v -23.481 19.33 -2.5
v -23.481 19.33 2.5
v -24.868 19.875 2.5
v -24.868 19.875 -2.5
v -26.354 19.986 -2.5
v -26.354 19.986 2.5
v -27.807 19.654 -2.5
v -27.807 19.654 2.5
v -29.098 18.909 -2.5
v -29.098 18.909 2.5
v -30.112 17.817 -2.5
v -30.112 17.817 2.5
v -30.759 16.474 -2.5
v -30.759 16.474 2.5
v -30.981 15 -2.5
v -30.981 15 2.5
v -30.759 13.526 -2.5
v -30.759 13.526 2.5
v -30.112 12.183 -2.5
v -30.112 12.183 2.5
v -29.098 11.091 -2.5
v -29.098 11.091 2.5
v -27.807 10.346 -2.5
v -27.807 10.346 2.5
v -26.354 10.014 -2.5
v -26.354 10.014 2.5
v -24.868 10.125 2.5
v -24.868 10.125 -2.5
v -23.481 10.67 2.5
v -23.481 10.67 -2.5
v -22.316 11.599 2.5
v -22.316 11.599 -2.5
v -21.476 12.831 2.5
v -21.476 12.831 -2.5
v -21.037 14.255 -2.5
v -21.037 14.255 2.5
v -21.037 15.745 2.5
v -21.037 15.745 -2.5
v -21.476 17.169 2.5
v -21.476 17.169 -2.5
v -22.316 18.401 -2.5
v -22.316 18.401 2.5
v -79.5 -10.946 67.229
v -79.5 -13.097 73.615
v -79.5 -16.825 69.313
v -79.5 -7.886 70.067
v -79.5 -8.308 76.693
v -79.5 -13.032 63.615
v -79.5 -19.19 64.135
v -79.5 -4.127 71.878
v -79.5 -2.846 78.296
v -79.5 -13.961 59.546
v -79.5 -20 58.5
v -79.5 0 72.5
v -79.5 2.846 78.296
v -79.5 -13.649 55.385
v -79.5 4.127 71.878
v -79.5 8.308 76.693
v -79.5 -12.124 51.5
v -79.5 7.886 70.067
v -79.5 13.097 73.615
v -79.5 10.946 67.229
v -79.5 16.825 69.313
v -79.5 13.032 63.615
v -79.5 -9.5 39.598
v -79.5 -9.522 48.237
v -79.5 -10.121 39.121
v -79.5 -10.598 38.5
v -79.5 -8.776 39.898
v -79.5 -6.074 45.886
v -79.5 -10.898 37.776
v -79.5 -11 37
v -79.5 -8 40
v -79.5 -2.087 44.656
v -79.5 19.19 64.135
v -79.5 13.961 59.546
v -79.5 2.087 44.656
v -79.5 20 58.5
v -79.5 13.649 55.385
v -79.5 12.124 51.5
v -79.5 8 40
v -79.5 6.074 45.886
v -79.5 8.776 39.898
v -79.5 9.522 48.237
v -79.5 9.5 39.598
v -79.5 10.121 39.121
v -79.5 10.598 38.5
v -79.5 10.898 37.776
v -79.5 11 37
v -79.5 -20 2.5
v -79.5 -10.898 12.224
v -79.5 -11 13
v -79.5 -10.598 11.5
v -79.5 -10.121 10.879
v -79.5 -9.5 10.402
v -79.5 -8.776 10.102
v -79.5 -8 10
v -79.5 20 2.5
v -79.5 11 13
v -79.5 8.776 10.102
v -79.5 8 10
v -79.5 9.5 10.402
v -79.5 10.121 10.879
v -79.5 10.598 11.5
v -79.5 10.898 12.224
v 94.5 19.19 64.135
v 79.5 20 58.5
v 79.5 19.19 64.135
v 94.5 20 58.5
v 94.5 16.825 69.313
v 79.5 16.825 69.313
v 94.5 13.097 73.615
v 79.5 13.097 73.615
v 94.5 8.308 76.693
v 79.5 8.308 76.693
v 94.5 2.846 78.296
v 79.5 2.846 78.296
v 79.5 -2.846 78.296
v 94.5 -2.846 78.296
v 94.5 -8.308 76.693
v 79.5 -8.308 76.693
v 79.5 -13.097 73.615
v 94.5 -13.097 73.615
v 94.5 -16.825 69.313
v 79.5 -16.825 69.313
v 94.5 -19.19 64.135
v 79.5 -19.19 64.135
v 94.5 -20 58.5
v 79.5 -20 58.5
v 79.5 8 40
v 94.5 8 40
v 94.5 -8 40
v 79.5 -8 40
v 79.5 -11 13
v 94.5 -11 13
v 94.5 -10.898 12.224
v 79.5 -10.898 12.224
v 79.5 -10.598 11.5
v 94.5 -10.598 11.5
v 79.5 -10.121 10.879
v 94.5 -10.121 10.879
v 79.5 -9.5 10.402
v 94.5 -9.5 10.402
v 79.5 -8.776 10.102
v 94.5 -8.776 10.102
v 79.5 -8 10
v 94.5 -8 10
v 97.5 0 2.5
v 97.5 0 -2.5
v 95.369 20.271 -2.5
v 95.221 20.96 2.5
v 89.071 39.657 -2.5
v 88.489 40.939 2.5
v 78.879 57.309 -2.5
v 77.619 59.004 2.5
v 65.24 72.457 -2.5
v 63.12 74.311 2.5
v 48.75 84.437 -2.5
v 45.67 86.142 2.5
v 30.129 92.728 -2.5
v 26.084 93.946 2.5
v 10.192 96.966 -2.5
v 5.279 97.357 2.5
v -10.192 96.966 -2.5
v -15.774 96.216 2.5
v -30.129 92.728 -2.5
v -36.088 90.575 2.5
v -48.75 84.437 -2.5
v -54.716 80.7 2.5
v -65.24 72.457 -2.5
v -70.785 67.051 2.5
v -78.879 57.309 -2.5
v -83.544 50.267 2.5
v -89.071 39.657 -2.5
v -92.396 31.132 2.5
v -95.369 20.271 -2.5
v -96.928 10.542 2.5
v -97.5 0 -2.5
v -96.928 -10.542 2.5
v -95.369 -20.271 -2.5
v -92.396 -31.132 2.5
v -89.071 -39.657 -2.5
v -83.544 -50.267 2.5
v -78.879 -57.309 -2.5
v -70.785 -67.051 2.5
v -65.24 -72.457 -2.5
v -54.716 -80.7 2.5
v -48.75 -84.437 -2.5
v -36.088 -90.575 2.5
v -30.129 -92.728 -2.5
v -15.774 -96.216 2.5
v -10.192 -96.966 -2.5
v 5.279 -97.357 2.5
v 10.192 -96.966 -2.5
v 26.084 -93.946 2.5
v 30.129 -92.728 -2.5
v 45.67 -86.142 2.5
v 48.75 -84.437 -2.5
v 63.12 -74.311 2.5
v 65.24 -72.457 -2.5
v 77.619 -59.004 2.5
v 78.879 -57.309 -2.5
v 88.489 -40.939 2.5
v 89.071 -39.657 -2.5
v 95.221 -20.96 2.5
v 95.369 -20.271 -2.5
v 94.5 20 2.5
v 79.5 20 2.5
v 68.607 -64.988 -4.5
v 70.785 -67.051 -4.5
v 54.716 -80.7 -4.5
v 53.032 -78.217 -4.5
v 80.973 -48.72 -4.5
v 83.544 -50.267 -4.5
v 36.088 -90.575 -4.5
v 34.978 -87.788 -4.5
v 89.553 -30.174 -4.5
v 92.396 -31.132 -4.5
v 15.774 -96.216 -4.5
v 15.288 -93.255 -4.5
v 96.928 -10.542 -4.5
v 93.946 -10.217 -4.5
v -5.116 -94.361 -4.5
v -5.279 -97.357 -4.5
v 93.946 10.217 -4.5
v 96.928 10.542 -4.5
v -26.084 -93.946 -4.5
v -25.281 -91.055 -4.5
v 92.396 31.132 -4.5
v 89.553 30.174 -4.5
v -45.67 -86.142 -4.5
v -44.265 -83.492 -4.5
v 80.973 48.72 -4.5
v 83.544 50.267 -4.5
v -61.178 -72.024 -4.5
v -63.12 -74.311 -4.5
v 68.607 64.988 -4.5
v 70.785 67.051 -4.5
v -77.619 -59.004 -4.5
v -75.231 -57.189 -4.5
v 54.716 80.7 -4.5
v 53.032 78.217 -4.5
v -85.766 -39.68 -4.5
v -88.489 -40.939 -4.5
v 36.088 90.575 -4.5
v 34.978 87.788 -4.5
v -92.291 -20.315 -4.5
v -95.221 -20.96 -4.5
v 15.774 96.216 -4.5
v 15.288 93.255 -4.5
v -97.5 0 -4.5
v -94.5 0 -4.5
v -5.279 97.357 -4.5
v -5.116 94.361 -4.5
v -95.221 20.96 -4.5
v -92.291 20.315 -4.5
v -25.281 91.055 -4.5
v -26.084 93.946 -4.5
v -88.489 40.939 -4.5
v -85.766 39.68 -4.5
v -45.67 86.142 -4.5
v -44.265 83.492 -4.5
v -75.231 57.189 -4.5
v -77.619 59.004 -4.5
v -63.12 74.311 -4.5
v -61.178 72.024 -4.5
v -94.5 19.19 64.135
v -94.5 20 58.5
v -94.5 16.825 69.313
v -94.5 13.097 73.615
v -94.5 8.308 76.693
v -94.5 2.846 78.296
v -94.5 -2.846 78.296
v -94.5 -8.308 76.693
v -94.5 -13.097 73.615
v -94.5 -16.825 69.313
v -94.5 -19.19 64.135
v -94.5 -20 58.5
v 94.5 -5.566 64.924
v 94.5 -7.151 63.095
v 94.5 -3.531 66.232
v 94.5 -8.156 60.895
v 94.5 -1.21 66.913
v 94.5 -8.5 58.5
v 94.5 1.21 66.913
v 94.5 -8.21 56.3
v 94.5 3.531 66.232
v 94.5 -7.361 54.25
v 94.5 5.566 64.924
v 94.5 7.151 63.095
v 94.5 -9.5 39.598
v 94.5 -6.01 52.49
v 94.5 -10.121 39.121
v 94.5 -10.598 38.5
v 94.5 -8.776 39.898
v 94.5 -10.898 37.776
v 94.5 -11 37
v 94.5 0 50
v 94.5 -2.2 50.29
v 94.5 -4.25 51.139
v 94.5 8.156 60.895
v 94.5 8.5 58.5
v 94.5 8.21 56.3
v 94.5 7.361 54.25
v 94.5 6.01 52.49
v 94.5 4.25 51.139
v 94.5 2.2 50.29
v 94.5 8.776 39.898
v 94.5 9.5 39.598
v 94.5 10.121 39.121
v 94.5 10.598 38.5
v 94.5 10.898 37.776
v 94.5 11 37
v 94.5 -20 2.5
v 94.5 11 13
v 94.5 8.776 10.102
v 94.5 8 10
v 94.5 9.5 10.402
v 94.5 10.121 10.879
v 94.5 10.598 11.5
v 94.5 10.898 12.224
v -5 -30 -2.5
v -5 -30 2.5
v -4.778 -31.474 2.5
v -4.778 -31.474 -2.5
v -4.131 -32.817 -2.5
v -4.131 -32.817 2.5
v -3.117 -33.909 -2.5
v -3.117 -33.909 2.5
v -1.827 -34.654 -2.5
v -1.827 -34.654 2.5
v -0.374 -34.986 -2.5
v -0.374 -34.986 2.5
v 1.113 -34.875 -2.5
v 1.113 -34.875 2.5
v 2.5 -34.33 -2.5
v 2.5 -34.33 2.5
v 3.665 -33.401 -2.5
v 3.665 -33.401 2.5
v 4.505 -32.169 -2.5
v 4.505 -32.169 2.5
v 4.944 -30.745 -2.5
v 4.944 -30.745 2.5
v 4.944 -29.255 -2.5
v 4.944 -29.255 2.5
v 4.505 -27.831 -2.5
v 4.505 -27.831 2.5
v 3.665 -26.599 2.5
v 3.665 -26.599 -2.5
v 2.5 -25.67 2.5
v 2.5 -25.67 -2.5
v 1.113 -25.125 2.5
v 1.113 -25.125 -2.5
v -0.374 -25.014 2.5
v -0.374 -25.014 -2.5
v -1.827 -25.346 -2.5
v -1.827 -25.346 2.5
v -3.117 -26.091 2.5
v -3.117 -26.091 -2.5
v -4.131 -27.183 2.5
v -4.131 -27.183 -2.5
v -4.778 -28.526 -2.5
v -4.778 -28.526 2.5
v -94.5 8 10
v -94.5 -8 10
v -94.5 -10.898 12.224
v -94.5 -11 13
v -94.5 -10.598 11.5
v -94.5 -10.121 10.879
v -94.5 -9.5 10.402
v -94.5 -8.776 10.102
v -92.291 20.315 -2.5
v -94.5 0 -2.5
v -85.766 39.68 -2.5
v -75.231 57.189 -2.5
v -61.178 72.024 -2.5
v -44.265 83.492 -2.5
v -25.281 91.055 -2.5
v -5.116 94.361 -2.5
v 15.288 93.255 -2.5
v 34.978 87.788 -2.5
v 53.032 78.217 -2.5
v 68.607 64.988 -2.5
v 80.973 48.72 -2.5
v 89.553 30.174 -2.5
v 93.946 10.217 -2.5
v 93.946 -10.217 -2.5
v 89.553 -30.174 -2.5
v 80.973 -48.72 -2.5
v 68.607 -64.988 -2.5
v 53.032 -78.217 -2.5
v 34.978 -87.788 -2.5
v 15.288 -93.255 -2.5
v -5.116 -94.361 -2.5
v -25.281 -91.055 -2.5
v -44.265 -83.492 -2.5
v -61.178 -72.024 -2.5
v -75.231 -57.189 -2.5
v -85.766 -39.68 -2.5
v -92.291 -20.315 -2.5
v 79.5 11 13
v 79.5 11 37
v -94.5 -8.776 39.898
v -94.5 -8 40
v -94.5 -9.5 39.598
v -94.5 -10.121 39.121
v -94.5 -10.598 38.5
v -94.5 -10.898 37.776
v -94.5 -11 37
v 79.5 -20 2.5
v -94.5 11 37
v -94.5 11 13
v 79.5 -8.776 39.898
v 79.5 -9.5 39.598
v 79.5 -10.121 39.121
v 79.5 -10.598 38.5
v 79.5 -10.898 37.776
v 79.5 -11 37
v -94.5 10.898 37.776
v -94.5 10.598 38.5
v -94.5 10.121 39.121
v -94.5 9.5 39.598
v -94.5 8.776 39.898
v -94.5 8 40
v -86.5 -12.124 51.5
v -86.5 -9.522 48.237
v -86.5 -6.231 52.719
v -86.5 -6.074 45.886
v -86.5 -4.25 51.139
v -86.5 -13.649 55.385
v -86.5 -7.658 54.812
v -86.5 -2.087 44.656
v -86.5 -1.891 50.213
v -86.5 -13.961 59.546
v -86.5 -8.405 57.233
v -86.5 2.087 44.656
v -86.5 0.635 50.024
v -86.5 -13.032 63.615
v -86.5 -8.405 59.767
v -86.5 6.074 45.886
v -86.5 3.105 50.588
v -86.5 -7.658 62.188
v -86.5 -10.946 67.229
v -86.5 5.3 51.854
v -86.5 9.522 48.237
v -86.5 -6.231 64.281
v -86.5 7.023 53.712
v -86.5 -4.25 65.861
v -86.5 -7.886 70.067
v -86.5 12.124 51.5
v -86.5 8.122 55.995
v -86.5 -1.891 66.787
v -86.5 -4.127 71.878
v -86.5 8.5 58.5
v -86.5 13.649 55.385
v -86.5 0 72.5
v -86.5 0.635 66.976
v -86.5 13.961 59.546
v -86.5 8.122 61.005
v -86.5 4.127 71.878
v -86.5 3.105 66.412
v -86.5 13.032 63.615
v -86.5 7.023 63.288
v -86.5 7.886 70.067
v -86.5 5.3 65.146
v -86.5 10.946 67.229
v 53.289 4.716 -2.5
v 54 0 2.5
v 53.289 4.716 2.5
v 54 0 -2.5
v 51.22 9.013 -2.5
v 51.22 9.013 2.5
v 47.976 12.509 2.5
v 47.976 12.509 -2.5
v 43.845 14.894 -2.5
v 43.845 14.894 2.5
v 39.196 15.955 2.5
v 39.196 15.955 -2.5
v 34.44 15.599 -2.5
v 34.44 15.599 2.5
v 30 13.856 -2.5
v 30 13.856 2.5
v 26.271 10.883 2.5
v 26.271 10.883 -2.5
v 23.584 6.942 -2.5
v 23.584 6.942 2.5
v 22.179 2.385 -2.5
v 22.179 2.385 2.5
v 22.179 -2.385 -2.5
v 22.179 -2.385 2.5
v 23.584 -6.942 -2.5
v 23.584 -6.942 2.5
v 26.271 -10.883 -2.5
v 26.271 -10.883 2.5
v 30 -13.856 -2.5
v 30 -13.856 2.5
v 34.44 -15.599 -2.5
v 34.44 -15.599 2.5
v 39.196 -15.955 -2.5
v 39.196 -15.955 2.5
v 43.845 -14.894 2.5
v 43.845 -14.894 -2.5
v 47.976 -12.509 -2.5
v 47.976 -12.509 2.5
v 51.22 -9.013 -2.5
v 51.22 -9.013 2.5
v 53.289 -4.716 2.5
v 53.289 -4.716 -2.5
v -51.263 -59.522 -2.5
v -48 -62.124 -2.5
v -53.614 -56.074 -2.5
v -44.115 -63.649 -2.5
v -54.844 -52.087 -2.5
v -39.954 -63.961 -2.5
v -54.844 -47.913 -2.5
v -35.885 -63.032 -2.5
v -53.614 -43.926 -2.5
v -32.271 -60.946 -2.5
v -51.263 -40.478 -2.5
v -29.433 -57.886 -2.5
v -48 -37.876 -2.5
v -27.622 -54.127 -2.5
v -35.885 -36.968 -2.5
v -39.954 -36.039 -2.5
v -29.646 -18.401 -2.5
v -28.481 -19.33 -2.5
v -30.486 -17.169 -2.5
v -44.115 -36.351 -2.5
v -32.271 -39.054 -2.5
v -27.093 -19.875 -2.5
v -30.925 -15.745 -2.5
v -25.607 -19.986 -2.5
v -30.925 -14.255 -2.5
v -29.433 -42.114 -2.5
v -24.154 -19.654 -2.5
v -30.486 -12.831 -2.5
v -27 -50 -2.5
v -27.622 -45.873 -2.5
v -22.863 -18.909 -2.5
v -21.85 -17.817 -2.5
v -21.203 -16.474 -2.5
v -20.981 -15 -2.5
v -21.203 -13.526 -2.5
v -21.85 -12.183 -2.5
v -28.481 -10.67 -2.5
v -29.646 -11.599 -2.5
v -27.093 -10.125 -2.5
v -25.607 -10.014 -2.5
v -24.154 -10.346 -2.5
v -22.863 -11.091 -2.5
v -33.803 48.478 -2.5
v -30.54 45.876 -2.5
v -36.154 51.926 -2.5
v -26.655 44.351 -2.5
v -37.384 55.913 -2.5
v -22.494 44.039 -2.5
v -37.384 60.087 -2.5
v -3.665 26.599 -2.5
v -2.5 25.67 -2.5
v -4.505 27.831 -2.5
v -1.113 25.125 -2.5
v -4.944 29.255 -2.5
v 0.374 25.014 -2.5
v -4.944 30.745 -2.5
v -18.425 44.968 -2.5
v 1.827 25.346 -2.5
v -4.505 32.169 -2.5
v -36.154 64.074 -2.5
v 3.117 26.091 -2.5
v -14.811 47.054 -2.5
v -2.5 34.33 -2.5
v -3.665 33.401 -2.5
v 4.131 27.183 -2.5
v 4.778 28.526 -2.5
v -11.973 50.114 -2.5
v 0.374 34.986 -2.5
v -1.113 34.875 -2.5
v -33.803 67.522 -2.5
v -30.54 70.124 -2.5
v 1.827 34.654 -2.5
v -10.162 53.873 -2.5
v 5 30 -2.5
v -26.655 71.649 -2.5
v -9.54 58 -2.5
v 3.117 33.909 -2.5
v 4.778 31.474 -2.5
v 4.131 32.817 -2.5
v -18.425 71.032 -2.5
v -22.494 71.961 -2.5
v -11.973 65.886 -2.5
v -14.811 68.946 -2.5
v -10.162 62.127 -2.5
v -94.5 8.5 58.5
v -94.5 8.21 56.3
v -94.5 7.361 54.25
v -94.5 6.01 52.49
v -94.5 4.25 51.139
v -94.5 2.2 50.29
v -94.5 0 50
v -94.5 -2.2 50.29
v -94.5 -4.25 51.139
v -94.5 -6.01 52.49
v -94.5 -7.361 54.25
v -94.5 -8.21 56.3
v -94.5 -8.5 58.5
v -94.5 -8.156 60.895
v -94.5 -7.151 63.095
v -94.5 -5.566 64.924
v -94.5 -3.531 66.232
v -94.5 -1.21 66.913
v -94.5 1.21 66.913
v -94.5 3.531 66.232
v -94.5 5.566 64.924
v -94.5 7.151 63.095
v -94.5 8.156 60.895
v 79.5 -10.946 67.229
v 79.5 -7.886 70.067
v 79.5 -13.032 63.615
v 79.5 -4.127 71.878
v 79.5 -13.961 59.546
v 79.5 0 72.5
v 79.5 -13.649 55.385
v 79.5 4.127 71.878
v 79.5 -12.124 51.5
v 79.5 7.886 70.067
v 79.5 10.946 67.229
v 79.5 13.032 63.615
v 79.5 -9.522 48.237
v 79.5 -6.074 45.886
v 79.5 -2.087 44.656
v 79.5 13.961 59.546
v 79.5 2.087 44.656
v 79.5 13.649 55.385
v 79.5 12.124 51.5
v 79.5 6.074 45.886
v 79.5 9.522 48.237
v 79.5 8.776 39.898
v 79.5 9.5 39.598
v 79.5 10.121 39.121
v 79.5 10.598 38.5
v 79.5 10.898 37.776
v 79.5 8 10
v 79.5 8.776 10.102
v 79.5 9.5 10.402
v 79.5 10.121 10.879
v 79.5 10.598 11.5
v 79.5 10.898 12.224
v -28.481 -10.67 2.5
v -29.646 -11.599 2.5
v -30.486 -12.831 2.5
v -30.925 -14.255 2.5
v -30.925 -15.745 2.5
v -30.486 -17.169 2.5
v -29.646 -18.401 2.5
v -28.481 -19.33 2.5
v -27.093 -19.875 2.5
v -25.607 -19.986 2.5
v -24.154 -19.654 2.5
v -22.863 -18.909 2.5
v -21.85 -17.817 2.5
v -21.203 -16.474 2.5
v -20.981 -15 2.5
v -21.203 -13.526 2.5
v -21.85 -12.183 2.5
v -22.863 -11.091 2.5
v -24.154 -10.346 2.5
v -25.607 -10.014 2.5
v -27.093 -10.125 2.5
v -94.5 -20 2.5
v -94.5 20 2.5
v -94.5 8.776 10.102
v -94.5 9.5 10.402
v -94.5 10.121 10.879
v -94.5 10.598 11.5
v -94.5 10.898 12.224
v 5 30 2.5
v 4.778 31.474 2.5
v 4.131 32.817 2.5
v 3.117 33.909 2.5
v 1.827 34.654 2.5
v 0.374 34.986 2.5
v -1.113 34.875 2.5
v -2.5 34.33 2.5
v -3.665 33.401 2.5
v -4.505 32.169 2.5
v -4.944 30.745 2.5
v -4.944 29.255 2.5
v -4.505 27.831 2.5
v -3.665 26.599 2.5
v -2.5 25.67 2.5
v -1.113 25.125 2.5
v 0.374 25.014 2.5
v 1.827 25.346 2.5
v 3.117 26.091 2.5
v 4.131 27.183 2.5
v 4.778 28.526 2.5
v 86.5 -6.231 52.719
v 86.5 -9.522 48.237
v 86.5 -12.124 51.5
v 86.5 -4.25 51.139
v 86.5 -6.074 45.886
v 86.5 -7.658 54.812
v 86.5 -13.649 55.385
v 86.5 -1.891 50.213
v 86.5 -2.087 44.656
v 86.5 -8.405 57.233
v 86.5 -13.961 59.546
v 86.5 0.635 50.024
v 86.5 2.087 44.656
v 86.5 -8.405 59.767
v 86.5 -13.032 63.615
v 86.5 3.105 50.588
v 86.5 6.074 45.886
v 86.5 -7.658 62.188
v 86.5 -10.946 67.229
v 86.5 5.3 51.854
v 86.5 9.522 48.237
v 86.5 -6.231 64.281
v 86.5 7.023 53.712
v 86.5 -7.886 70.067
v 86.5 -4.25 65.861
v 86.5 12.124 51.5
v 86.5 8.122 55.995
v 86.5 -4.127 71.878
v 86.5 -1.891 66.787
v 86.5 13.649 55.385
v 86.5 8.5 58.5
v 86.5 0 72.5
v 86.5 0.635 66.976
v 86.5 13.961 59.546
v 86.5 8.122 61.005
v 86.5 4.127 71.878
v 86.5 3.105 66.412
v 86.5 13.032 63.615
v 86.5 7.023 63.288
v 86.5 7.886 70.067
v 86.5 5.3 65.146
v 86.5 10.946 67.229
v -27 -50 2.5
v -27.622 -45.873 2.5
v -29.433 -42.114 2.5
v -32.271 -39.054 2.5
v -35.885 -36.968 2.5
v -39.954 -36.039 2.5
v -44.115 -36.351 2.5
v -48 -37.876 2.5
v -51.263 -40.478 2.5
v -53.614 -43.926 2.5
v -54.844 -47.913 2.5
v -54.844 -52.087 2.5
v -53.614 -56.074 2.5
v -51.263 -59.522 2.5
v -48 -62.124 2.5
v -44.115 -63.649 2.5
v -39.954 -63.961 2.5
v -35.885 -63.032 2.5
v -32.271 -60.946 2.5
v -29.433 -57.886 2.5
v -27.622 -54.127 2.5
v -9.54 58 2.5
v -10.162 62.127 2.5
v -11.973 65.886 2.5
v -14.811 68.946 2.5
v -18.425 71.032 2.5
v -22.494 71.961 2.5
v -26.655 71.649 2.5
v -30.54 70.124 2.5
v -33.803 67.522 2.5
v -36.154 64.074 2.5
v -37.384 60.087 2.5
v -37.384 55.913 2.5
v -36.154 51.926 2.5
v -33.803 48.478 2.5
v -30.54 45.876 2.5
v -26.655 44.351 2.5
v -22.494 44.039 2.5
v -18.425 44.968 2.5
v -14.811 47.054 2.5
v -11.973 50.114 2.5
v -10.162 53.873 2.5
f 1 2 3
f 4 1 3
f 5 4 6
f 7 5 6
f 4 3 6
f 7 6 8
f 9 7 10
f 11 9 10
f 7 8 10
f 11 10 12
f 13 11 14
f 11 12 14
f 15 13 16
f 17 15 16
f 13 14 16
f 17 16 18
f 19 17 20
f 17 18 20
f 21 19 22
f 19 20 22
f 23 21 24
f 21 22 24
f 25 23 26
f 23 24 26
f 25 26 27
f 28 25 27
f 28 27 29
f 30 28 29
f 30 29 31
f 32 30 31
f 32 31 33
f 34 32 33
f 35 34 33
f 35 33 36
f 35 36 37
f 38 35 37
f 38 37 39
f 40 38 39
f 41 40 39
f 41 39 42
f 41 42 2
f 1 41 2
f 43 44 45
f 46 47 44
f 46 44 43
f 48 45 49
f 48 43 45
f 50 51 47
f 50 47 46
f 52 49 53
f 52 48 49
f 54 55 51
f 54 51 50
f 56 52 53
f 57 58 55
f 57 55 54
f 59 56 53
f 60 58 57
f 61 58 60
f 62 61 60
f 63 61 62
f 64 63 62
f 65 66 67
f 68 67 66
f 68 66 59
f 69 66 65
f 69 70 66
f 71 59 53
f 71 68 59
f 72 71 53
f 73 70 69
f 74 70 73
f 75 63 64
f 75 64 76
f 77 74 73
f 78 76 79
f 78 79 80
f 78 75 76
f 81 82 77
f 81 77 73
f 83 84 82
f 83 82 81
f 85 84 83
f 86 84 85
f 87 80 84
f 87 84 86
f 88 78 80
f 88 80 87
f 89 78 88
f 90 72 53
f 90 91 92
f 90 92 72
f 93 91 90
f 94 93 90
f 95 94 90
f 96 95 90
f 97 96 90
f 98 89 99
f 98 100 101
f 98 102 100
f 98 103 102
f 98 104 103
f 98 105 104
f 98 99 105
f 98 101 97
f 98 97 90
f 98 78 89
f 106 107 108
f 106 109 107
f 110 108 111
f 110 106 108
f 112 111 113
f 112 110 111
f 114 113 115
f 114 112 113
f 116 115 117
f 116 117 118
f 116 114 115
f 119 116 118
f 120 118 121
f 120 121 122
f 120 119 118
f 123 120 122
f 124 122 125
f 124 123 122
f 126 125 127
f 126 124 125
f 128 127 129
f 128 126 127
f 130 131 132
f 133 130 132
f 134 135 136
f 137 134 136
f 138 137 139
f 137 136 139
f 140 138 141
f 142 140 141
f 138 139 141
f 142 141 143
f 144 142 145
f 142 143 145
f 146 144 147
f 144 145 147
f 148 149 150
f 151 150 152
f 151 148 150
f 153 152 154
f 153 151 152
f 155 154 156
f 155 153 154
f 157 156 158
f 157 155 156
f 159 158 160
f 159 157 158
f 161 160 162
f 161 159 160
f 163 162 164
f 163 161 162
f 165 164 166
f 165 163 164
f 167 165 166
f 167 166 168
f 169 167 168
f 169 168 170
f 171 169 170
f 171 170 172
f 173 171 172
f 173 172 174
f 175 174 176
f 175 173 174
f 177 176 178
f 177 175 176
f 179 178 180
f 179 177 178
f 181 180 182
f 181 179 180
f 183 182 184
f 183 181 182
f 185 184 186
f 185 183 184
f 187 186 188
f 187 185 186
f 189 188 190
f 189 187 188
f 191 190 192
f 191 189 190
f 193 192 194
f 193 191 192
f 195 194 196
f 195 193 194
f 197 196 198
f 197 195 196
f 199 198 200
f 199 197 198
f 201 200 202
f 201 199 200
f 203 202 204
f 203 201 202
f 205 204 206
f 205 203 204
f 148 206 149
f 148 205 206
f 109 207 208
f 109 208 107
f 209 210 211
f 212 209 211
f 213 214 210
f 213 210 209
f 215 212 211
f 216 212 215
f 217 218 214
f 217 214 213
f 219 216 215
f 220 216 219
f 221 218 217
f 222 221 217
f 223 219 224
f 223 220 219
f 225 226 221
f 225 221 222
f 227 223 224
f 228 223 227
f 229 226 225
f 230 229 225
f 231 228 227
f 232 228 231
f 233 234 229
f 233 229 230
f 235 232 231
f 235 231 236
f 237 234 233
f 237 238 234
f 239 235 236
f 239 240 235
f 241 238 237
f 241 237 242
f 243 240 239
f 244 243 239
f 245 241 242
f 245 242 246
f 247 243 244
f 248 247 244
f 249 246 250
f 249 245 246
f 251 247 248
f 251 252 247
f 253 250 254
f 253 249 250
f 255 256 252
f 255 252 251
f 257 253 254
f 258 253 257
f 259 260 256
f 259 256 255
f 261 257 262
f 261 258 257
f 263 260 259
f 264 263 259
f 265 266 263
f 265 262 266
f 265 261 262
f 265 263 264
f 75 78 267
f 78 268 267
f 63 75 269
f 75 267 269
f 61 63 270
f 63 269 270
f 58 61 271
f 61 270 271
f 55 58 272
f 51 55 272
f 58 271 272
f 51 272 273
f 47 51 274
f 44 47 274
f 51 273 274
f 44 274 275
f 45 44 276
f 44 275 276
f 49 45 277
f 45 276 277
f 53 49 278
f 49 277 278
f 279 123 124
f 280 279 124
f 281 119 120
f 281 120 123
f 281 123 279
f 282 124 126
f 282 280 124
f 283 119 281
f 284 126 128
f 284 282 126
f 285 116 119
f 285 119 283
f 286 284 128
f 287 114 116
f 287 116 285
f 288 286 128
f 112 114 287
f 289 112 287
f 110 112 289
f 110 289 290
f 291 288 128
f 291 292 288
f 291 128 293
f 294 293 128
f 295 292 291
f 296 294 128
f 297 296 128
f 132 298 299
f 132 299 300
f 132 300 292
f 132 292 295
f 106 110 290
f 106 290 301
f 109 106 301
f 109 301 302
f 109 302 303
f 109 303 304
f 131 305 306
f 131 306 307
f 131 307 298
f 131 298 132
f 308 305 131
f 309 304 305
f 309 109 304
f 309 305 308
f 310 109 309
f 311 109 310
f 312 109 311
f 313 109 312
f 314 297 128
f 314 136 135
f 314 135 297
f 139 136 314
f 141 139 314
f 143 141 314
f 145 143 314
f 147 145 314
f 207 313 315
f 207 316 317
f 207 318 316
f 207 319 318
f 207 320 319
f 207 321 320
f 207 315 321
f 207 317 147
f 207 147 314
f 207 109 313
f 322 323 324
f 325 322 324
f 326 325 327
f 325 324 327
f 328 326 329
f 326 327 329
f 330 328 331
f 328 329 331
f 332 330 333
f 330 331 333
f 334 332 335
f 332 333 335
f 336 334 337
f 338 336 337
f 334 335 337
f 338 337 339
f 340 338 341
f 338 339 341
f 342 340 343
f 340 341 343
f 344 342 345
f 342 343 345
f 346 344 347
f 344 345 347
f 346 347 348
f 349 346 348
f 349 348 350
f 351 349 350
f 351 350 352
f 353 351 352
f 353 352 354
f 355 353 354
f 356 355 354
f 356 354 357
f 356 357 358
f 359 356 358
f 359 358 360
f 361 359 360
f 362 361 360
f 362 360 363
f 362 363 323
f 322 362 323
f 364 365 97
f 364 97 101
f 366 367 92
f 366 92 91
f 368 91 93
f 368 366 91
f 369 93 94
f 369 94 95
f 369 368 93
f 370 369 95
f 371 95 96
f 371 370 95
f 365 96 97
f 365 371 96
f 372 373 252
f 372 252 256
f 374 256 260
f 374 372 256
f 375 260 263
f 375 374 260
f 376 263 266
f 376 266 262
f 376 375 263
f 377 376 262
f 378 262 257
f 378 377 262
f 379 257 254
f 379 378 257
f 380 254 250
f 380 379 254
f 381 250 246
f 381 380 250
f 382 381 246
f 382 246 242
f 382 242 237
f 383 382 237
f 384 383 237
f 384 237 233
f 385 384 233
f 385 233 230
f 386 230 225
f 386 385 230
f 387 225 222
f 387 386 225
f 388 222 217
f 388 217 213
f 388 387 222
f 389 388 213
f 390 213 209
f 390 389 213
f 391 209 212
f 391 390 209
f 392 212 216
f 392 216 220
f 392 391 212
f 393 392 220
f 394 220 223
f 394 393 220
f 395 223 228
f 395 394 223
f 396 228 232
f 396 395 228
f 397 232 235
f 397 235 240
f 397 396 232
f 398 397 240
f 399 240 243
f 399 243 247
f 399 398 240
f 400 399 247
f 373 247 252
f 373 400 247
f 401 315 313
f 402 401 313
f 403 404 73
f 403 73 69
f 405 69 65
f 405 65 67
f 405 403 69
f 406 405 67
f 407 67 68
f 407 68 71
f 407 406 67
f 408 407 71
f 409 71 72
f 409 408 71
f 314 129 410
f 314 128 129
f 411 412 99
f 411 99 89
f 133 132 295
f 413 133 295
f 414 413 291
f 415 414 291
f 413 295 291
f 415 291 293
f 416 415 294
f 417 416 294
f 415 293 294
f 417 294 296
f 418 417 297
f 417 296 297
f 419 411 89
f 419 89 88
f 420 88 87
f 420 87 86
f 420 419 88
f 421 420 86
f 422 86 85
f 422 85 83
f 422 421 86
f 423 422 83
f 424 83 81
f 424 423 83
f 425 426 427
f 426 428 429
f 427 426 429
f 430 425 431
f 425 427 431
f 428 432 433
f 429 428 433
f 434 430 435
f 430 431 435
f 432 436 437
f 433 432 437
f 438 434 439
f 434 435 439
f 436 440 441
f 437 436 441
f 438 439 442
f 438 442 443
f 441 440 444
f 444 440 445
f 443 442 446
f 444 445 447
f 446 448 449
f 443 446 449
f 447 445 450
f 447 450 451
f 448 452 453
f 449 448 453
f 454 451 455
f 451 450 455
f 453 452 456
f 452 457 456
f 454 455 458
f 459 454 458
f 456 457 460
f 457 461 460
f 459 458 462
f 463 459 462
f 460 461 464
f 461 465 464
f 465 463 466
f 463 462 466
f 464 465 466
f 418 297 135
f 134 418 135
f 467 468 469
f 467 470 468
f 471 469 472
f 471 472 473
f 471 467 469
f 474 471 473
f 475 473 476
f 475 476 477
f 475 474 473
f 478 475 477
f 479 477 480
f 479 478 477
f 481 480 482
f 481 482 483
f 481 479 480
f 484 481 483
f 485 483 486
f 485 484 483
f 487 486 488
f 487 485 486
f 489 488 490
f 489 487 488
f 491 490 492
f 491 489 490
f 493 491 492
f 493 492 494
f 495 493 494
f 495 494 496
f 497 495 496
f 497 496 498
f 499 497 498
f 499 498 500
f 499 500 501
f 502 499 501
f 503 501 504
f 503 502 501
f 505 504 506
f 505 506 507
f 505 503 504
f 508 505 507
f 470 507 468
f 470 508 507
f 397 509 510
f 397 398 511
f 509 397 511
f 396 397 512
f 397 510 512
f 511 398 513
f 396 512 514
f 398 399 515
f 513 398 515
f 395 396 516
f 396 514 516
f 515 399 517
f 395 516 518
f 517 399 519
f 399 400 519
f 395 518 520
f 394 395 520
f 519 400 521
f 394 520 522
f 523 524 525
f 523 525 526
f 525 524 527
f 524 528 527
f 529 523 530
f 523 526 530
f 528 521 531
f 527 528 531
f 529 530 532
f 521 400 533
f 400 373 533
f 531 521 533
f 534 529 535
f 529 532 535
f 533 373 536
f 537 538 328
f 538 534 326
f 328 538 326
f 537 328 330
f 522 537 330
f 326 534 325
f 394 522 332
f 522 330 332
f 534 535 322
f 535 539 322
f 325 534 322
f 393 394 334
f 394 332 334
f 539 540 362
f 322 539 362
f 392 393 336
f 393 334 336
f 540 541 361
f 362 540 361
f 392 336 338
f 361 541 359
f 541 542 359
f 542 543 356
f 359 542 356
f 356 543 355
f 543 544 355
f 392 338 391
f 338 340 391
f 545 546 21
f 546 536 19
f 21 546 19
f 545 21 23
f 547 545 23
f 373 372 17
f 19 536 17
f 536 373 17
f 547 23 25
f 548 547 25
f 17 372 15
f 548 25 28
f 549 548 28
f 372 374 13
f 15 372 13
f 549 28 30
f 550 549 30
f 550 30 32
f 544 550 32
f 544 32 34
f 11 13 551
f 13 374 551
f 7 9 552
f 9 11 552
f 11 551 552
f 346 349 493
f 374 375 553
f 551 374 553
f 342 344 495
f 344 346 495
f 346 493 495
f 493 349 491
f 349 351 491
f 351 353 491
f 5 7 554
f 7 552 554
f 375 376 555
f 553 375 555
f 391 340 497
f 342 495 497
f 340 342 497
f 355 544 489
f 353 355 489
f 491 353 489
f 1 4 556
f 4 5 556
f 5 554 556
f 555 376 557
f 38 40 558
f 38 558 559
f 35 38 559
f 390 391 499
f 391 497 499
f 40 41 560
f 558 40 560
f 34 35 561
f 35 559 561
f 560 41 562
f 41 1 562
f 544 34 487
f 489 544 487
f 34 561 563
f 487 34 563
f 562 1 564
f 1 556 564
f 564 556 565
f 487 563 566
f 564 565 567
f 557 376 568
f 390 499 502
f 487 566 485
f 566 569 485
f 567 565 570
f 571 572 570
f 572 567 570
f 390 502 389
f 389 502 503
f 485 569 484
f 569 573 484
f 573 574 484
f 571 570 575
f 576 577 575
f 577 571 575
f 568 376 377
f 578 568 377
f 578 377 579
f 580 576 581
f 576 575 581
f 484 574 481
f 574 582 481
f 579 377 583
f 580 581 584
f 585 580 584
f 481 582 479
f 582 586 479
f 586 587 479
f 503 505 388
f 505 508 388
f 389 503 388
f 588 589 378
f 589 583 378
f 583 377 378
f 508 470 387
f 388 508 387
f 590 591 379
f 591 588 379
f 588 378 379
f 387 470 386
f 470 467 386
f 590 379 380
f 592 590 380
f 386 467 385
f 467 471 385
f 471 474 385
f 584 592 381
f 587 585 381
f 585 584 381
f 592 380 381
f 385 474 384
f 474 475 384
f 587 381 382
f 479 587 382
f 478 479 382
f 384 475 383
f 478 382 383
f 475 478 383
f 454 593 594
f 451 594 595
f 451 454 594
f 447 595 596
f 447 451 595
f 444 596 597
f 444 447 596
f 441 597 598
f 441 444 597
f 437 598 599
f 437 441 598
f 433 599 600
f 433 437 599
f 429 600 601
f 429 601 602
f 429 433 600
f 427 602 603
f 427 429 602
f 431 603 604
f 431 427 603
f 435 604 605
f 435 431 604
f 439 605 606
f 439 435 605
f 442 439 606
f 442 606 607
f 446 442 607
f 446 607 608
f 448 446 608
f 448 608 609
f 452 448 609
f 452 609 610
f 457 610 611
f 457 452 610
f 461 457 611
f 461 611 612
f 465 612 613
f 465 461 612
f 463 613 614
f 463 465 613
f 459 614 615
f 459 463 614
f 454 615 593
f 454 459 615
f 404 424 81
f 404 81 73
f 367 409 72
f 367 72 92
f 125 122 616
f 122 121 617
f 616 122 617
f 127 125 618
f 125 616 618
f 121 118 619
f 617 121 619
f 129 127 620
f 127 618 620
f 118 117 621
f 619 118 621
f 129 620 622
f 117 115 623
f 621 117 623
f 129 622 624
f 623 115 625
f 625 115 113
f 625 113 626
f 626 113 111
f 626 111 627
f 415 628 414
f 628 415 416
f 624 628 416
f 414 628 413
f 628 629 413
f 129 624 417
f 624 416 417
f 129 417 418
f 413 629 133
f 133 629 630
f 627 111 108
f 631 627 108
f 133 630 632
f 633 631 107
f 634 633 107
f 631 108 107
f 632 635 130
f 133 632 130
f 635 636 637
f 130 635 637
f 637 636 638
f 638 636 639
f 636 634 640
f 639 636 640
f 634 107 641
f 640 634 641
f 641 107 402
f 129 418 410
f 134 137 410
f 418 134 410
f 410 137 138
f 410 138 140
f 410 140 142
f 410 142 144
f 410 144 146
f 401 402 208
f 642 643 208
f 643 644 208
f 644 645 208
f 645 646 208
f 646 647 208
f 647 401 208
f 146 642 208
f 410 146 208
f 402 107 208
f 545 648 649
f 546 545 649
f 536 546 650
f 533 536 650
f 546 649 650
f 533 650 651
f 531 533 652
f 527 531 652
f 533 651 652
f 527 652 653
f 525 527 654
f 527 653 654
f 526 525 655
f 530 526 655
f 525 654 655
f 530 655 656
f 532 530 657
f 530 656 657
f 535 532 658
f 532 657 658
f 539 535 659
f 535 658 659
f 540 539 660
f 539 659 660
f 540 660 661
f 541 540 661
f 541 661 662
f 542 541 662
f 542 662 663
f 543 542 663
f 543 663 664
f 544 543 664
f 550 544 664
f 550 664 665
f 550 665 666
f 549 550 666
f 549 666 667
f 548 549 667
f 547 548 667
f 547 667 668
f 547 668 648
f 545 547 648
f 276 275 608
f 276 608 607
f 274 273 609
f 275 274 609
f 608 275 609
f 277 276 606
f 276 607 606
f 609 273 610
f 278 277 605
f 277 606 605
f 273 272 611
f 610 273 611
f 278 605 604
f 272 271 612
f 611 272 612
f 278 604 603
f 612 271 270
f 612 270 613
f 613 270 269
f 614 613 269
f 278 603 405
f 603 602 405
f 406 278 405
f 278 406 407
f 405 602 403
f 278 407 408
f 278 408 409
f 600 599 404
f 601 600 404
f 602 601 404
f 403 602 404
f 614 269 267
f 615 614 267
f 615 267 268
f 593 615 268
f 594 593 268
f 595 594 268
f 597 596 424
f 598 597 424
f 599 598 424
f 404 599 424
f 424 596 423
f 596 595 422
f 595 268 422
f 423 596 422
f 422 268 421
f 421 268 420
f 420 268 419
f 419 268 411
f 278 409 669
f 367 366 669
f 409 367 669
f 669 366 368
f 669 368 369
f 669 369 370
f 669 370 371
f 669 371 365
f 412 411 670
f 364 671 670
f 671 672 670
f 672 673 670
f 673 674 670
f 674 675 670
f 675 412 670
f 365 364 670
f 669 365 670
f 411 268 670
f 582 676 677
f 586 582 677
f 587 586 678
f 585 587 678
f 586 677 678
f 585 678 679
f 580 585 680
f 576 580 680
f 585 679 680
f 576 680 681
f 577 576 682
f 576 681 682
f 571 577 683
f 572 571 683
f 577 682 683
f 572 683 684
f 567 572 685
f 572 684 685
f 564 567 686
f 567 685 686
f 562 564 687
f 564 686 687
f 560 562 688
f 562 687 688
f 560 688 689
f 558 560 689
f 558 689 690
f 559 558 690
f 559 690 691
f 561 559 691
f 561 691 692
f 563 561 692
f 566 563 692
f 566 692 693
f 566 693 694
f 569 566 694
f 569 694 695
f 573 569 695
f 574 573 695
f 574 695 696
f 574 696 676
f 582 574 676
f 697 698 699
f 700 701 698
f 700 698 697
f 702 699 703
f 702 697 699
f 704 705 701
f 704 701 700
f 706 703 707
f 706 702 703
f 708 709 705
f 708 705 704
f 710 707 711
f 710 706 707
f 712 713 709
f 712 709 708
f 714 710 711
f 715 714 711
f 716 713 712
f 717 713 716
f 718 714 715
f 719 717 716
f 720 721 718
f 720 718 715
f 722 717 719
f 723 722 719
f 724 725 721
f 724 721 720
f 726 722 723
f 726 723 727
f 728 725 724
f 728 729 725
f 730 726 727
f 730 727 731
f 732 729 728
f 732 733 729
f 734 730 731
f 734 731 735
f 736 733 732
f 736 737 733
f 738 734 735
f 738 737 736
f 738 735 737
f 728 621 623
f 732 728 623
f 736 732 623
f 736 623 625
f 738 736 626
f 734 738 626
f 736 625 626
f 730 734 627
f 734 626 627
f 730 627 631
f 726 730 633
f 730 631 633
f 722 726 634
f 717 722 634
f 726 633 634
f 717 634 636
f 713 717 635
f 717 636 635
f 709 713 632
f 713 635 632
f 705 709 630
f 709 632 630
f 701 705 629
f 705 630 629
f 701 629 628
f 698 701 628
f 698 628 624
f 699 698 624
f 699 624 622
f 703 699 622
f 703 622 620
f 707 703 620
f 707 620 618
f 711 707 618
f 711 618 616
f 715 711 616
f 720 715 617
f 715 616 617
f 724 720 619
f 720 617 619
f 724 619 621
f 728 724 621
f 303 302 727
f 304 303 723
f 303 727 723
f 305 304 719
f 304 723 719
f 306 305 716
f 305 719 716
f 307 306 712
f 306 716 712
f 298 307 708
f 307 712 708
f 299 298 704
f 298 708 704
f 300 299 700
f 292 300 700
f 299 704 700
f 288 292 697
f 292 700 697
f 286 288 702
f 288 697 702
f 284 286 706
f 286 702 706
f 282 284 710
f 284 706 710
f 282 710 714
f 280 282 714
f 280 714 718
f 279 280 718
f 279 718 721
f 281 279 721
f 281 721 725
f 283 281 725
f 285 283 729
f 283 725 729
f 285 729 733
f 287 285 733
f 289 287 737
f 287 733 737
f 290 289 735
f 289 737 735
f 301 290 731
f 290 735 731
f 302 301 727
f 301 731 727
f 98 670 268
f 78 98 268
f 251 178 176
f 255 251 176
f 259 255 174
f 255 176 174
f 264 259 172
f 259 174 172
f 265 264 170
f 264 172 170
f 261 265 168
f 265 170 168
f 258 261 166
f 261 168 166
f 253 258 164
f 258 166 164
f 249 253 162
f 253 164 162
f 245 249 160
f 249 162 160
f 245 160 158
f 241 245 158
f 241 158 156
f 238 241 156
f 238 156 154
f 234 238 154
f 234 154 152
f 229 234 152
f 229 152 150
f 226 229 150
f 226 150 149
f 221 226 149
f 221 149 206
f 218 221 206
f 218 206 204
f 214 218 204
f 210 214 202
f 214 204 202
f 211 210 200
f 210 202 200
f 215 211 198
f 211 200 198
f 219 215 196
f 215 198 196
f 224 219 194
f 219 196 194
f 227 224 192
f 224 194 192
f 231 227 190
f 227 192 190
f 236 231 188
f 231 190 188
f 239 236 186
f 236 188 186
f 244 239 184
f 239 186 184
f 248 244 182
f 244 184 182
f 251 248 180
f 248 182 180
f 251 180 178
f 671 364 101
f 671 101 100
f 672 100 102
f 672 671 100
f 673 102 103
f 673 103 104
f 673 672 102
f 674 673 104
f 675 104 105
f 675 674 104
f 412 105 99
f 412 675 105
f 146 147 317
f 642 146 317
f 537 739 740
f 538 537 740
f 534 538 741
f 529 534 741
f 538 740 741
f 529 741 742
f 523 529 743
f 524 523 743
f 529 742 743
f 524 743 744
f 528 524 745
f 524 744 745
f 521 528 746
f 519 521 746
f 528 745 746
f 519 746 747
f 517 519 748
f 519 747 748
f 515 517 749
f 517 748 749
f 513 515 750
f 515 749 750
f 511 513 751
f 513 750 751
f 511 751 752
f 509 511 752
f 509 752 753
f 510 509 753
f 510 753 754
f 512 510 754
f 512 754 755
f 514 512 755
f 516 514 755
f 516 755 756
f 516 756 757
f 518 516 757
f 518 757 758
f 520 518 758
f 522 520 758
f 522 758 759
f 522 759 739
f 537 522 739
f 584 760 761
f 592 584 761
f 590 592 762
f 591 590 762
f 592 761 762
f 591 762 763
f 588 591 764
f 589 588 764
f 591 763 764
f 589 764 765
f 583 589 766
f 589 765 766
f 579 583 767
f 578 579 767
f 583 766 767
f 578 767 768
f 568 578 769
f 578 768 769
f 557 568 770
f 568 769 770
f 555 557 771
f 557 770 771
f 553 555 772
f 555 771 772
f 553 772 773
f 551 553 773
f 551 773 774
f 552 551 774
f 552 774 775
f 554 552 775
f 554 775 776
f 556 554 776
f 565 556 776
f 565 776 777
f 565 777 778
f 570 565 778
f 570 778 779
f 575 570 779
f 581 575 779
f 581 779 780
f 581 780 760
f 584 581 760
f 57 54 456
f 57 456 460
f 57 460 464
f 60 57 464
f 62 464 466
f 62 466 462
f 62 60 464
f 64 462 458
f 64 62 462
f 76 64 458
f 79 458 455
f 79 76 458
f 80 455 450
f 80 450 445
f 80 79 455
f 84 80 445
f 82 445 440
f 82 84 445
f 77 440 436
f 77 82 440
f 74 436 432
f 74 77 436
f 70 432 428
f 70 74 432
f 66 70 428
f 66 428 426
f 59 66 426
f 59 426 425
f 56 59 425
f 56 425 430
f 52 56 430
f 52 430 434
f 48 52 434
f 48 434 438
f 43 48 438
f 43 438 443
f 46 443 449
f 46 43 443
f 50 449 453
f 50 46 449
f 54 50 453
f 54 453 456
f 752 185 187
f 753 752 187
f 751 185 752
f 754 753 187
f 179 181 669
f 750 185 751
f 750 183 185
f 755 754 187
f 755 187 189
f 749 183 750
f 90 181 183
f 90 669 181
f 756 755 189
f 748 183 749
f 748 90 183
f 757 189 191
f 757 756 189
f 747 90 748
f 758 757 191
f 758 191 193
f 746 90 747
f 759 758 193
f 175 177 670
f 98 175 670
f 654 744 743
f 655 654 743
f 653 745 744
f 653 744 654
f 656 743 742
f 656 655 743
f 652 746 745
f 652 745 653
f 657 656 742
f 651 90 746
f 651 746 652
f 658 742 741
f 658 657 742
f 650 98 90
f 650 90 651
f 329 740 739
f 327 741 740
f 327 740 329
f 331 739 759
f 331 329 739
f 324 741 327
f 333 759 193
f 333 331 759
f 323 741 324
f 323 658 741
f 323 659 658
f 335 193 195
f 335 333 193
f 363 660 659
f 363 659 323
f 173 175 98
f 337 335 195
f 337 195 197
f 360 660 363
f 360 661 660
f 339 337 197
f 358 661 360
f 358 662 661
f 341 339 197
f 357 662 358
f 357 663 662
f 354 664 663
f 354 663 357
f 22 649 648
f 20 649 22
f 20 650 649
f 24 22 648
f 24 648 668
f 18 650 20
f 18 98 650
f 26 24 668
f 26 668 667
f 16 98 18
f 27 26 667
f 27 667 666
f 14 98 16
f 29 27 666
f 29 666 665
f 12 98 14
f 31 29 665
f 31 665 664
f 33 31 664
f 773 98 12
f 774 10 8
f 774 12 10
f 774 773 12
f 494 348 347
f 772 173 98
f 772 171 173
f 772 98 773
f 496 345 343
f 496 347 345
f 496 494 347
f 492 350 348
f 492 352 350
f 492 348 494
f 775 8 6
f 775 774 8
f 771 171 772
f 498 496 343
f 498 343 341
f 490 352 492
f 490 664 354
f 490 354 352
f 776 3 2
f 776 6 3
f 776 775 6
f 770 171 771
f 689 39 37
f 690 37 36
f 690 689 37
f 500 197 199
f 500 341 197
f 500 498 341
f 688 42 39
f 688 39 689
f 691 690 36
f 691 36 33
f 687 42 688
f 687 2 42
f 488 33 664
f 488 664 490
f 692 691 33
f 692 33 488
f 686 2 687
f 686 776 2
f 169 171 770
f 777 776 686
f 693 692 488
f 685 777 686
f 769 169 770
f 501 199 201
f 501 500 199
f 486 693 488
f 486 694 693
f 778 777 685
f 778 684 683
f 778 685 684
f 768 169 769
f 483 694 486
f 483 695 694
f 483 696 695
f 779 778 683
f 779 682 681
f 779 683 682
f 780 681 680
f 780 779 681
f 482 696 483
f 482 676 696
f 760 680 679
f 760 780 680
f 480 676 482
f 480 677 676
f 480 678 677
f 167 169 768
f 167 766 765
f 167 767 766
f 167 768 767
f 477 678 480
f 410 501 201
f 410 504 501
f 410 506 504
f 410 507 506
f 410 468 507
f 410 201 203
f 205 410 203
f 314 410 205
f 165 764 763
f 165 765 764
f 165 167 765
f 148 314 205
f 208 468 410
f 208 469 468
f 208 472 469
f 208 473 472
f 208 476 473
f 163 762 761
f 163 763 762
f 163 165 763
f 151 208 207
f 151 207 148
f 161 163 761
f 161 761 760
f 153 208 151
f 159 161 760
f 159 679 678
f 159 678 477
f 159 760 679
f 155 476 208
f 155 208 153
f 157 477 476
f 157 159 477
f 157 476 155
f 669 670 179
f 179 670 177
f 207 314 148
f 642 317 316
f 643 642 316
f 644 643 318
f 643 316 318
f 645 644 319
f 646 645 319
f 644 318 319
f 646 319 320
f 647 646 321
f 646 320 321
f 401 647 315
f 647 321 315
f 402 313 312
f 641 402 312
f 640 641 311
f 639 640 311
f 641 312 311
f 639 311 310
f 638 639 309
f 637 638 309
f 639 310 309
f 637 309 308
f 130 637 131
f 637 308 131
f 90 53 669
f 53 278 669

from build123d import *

# Parameters (mm, degrees)
SKETCH1_R           = 97.5
SKETCH1_R_2         = 16
BOSS_EXTRUDE1_DEPTH = 2.5
SKETCH2_R           = 5
CUT_EXTRUDE1_DEPTH  = 138.976447265
CIRPATTERN1_COUNT   = 4
CIRPATTERN1_ANGLE   = 180
SKETCH4_R           = 97.5
SKETCH4_R_2         = 94.5
BOSS_EXTRUDE2_DEPTH = 2
SKETCH5_R           = 8.5
BOSS_EXTRUDE3_DEPTH = 7.5
SKETCH6_R           = 14
CUT_EXTRUDE2_DEPTH  = 7
CUT_EXTRUDE3_REACH  = 231.2
CUT_EXTRUDE4_REACH  = 159.444
SKETCH8_R           = 14
SKETCH9_R           = 14
CUT_EXTRUDE5_DEPTH  = 158.44364071


with BuildPart() as part:
    # Sketch1 → Boss-Extrude1 (new, symmetric)
    with BuildSketch(Plane.XY):
        Circle(SKETCH1_R)
        with Locations((38, 0)):
            Circle(SKETCH1_R_2, mode=Mode.SUBTRACT)
    extrude(amount=BOSS_EXTRUDE1_DEPTH, both=True)

    # Sketch2 → Cut-Extrude1 (cut, through all)
    with BuildSketch(Plane.XY.offset(2.5)):
        with Locations((0, 30)):
            Circle(SKETCH2_R)
    cut_extrude1 = extrude(amount=-CUT_EXTRUDE1_DEPTH, mode=Mode.SUBTRACT)

    # CirPattern1: Cut-Extrude1 ×4 about axis
    cirpattern1_axis = Axis((0, 0, 2.5), (0, 0, 1))
    for i in range(1, CIRPATTERN1_COUNT):
        add(cut_extrude1.rotate(cirpattern1_axis, i * CIRPATTERN1_ANGLE / (CIRPATTERN1_COUNT - 1)), mode=Mode.SUBTRACT)

    # Sketch4 → Boss-Extrude2 (add)
    with BuildSketch(Plane(origin=(0, 0, -2.5), x_dir=(-1, 0, 0), z_dir=(0, 0, -1))):
        Circle(SKETCH4_R)
        Circle(SKETCH4_R_2, mode=Mode.SUBTRACT)
    extrude(amount=BOSS_EXTRUDE2_DEPTH)

    # Sketch5 → Boss-Extrude3 (add, symmetric)
    with BuildSketch(Plane(origin=(87, 0, 0), x_dir=(0, 0, -1), z_dir=(1, 0, 0))):
        with BuildLine():
            Line((-2.5, 20), (-58.5, 20))
            ThreePointArc((-58.5, 20), (-78.5, 0), (-58.5, -20))
            Line((-58.5, -20), (-2.5, -20))
            Line((-2.5, -20), (-2.5, 20))
        make_face()
        with Locations((-58.5, 0)):
            Circle(SKETCH5_R, mode=Mode.SUBTRACT)
    boss_extrude3 = extrude(amount=BOSS_EXTRUDE3_DEPTH, both=True)

    # Sketch6 → Cut-Extrude2 (cut)
    with BuildSketch(Plane.ZY.offset(-79.5)):
        with Locations((58.5, 0)):
            Circle(SKETCH6_R)
    cut_extrude2 = extrude(amount=-CUT_EXTRUDE2_DEPTH, mode=Mode.SUBTRACT)

    # Sketch7 → Cut-Extrude3 (cut, up to next)
    with BuildSketch(Plane(origin=(94.5, 0, 0), x_dir=(0, 0, -1), z_dir=(1, 0, 0)), mode=Mode.PRIVATE) as cut_extrude3_sk1:
        with BuildLine():
            Line((-13, 11), (-37, 11))
            ThreePointArc((-37, 11), (-39.121320344, 10.121320344), (-40, 8))
            Line((-40, 8), (-40, -8))
            ThreePointArc((-40, -8), (-39.121320344, -10.121320344), (-37, -11))
            Line((-37, -11), (-13, -11))
            ThreePointArc((-13, -11), (-10.878679656, -10.121320344), (-10, -8))
            Line((-10, -8), (-10, 8))
            ThreePointArc((-10, 8), (-10.878679656, 10.121320344), (-13, 11))
        make_face()
    cut_extrude3_tool1 = extrude(cut_extrude3_sk1.sketch, amount=-CUT_EXTRUDE3_REACH, mode=Mode.PRIVATE) & part.part
    cut_extrude3 = cut_extrude3_tool1.solids().sort_by_distance((94.5, 0, 25))[0]
    add(cut_extrude3, mode=Mode.SUBTRACT)

    # Mirror1: Boss-Extrude3, Cut-Extrude2, Cut-Extrude3 across plane
    add(boss_extrude3.mirror(Plane(origin=(0, 0, 0), x_dir=(0, 0, 1), z_dir=(1, 0, 0))))
    add(cut_extrude2.mirror(Plane(origin=(0, 0, 0), x_dir=(0, 0, 1), z_dir=(1, 0, 0))), mode=Mode.SUBTRACT)
    add(cut_extrude3.mirror(Plane(origin=(0, 0, 0), x_dir=(0, 0, 1), z_dir=(1, 0, 0))), mode=Mode.SUBTRACT)

    # Sketch8 → Cut-Extrude4 (cut, up to next)
    with BuildSketch(Plane.XY.offset(2.5), mode=Mode.PRIVATE) as cut_extrude4_sk1:
        with Locations((-41, -50)):
            Circle(SKETCH8_R)
    cut_extrude4_tool1 = extrude(cut_extrude4_sk1.sketch, amount=-CUT_EXTRUDE4_REACH, mode=Mode.PRIVATE) & part.part
    add(cut_extrude4_tool1.solids().sort_by_distance((-41, -50, 2.5))[0], mode=Mode.SUBTRACT)

    # Sketch9 → Cut-Extrude5 (cut, through all)
    with BuildSketch(Plane.XY.offset(2.5)):
        with Locations((-23.540161495, 58)):
            Circle(SKETCH9_R)
    extrude(amount=-CUT_EXTRUDE5_DEPTH, mode=Mode.SUBTRACT)


solid = part.part
